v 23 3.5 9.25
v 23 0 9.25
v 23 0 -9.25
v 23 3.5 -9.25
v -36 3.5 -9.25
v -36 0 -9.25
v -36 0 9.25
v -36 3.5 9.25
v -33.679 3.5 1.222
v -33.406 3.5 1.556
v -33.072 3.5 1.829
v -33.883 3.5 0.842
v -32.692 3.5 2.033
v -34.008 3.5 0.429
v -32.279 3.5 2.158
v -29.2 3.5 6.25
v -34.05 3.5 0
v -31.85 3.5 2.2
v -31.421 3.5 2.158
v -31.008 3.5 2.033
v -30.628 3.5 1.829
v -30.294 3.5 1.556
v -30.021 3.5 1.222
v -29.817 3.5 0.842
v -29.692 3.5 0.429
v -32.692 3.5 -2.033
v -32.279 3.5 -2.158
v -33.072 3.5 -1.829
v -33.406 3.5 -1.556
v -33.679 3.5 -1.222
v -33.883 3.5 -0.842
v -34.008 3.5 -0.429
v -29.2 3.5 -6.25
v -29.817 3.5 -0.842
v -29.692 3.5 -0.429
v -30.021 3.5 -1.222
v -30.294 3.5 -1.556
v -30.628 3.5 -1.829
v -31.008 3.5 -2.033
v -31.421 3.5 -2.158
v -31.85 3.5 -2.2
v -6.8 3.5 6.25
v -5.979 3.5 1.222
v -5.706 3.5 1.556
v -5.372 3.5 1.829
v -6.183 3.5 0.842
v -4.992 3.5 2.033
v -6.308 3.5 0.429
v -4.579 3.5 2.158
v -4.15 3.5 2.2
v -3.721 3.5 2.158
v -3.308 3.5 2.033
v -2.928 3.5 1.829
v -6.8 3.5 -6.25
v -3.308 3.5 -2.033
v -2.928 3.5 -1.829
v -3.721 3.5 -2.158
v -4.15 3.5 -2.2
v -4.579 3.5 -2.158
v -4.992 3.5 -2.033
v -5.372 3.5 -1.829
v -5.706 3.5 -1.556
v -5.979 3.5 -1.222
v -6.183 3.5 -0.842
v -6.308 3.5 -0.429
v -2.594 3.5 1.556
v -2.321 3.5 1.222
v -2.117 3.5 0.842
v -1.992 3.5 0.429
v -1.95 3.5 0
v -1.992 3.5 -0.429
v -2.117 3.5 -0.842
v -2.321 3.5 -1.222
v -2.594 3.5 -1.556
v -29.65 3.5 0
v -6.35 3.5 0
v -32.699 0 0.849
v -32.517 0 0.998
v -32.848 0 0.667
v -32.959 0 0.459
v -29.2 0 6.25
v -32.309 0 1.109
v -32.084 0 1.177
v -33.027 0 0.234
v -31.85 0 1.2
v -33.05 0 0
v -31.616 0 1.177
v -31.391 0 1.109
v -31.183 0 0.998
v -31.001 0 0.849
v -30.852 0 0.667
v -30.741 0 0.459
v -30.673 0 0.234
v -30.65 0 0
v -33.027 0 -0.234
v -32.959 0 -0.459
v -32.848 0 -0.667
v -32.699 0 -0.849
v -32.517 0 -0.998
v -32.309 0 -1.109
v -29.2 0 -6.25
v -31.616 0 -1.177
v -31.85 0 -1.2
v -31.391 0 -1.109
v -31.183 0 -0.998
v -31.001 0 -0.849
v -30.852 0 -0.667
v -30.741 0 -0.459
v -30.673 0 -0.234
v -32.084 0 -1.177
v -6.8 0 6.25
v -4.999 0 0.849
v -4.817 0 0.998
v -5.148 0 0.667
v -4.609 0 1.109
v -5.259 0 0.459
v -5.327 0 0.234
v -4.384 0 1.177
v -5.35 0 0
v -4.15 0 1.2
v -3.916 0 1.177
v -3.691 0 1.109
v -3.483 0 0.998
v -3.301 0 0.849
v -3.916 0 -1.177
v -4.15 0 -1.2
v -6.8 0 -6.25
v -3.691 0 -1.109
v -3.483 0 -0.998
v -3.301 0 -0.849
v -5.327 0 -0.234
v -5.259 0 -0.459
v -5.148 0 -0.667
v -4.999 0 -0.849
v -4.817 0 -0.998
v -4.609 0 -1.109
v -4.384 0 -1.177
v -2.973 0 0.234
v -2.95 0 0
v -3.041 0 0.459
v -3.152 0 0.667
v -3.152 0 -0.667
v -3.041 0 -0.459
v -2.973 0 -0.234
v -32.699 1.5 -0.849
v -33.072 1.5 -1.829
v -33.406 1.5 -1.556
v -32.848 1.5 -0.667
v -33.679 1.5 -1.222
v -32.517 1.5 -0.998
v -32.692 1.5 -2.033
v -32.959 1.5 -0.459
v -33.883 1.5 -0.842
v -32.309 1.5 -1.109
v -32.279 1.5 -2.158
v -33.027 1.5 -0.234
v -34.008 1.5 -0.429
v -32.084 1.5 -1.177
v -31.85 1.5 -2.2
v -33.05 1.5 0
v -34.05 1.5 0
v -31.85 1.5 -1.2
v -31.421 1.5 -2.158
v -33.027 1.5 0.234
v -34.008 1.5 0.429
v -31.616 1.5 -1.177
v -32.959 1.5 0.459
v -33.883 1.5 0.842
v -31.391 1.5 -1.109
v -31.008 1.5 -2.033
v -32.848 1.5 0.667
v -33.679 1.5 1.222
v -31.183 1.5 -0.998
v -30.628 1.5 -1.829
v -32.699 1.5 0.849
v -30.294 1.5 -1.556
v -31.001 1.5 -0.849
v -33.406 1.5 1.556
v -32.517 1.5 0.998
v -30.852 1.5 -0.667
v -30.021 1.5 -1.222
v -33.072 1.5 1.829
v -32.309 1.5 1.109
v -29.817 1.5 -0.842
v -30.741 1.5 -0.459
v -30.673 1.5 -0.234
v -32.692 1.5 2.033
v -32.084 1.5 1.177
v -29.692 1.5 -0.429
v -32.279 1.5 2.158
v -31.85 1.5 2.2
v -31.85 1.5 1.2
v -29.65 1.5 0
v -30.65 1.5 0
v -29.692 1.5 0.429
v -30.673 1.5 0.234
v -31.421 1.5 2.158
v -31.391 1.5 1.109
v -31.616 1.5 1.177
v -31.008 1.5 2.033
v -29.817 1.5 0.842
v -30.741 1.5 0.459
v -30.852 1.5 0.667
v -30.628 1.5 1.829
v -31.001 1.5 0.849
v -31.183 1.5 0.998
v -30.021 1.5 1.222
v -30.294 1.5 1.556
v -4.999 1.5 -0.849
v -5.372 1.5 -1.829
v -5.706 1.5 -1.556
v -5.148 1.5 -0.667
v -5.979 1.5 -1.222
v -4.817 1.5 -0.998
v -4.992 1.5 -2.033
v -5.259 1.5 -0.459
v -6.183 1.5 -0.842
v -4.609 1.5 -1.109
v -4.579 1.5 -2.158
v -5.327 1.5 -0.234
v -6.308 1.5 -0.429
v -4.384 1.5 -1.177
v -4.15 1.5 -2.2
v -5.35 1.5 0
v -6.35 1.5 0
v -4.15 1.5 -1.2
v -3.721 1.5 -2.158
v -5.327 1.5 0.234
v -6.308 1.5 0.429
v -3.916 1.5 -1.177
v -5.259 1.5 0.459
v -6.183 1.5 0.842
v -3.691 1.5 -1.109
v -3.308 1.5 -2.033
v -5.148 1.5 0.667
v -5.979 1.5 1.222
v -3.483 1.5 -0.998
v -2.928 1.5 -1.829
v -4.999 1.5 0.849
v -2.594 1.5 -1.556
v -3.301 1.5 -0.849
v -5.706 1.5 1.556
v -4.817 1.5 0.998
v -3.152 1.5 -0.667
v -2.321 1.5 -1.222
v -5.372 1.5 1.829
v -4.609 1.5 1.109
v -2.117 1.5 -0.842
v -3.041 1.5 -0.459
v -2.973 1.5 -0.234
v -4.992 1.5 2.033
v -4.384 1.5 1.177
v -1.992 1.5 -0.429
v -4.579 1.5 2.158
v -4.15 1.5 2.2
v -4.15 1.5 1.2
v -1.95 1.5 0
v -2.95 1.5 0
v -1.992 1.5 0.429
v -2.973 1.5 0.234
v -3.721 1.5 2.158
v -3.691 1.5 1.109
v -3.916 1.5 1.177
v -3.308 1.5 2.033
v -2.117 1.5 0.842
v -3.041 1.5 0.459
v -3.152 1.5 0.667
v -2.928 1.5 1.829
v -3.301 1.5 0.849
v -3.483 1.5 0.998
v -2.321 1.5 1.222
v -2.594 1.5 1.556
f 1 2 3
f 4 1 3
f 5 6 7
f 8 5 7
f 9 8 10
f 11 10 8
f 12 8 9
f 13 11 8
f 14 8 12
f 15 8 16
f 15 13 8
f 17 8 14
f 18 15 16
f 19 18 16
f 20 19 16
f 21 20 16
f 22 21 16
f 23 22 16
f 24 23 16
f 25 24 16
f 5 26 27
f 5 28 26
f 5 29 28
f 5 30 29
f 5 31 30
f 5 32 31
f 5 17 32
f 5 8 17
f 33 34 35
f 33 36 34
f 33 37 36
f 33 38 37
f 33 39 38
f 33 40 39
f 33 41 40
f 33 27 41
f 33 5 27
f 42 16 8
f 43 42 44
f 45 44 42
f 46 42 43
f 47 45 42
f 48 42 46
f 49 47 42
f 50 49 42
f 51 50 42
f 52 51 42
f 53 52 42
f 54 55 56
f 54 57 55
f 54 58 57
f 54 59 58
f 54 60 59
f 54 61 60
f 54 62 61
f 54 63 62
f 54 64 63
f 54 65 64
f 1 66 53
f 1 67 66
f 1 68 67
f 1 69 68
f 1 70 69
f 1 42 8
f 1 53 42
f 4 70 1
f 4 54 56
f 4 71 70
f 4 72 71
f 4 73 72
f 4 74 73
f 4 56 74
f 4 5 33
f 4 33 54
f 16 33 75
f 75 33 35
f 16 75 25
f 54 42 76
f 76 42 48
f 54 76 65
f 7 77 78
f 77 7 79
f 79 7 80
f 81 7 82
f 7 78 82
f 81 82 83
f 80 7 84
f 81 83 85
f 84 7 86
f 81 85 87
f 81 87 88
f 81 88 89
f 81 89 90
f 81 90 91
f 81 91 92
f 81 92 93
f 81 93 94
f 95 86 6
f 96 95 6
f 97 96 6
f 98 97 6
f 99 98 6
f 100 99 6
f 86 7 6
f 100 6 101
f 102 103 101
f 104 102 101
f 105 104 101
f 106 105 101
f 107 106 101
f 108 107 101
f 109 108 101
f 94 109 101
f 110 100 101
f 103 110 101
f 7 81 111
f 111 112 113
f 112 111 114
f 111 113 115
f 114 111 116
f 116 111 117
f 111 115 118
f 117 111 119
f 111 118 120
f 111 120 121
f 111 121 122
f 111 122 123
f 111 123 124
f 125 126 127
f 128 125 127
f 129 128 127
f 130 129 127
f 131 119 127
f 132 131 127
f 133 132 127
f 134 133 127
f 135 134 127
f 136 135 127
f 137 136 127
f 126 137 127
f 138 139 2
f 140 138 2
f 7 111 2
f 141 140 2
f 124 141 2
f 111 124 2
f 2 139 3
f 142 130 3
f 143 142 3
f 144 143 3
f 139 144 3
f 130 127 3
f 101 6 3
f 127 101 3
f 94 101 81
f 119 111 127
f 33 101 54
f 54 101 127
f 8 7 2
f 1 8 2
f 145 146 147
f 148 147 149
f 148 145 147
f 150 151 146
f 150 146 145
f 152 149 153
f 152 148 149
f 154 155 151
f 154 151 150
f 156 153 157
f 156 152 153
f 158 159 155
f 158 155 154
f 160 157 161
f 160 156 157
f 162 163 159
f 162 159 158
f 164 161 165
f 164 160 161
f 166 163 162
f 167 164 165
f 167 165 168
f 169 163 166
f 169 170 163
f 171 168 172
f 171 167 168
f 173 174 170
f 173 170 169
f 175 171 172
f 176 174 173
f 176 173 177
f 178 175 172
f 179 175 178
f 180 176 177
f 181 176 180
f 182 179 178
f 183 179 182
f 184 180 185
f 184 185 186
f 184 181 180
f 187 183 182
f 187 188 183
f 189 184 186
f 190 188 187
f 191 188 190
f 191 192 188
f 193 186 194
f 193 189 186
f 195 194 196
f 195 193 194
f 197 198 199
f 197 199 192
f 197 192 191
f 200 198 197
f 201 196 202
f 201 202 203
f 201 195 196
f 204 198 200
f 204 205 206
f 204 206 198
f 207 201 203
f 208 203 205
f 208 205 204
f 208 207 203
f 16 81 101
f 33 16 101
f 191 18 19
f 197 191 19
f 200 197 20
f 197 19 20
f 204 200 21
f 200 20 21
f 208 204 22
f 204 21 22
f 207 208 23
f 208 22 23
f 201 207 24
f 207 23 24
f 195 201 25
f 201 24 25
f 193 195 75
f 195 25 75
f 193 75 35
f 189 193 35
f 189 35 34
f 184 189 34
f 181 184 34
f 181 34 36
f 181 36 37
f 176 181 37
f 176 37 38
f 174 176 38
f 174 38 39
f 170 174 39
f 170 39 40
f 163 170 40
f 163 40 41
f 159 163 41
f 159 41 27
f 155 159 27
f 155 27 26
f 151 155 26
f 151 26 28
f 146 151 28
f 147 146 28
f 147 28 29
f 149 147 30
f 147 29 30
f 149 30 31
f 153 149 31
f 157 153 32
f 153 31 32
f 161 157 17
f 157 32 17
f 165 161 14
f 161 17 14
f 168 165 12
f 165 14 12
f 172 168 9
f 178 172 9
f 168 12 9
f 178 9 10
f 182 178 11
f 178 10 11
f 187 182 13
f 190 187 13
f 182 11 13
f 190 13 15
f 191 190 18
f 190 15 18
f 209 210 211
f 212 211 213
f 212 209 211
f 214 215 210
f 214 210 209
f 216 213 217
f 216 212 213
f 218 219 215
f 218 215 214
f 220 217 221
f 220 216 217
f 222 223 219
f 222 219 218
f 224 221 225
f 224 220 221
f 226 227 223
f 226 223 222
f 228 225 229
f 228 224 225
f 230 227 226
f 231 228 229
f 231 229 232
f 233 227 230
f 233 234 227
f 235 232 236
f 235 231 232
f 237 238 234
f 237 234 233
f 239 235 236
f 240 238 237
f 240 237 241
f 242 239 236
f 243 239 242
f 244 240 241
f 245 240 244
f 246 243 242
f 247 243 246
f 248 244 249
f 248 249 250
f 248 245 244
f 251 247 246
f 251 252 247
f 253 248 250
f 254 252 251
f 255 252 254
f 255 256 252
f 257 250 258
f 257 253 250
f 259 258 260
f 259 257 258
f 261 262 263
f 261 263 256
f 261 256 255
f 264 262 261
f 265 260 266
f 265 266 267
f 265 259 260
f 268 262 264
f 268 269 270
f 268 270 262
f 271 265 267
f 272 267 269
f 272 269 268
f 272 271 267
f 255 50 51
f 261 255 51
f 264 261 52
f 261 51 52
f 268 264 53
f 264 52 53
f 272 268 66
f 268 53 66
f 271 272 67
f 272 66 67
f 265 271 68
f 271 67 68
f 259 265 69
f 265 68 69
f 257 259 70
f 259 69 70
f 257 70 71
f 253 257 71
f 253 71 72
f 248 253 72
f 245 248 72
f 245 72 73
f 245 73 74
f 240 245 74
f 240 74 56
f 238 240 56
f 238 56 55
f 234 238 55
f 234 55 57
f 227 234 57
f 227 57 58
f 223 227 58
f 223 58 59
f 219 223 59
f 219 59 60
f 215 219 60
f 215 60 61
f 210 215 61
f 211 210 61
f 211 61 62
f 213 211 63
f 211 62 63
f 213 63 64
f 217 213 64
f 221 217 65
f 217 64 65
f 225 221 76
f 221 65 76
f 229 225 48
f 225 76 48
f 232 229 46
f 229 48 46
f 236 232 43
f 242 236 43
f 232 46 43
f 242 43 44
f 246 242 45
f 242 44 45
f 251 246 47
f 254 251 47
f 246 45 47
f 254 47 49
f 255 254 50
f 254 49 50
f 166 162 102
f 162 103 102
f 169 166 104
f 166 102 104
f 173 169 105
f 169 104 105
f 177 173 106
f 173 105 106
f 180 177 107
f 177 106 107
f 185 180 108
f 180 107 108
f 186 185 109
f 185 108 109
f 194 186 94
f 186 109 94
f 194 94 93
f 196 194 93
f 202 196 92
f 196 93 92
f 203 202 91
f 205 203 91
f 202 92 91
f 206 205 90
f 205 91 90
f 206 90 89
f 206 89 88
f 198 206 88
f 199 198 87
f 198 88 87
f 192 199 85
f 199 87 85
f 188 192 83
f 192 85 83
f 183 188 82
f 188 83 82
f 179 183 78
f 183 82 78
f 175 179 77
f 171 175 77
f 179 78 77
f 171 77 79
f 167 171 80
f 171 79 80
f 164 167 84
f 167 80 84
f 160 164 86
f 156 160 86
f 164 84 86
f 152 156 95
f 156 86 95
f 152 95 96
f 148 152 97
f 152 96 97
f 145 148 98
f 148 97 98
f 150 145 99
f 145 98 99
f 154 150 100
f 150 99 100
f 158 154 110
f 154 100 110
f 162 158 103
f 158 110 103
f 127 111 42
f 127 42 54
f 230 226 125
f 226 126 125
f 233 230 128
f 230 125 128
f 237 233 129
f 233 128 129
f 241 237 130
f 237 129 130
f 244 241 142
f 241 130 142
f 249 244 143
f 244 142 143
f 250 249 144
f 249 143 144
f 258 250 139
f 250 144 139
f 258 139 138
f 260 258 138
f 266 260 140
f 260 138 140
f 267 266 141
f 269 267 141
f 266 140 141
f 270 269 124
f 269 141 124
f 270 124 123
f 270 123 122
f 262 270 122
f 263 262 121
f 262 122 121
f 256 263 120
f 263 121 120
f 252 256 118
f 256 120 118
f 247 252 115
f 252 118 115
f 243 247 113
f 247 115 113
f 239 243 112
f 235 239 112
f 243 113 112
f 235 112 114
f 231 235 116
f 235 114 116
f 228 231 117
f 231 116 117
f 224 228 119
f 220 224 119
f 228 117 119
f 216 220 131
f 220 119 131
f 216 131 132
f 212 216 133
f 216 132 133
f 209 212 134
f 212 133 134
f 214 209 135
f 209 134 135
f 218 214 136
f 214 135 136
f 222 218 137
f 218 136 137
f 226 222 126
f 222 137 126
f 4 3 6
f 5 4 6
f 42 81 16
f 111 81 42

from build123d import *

# Parameters (mm, degrees)
SKETCH_1_W                   = 22.4
SKETCH_1_H                   = 12.5
EXTRUDE_1_DEPTH              = 3.5
HOLE_WIZARD_M2_2_D           = 2.4
HOLE_WIZARD_M2_2_CBORE_D     = 4.4
HOLE_WIZARD_M2_2_CBORE_DEPTH = 2


with BuildPart() as part:
    # 草图1 → 凸台-拉伸1 (new body)
    with BuildSketch(Plane(origin=(0, 0, 0), x_dir=(1, 0, 0), z_dir=(0, 1, 0))):
        Polygon((-36, -9.25), (0, -9.25), (23, -9.25), (23, 9.25), (0, 9.25), (-36, 9.25), align=None)
        with Locations((-18, 0)):
            Rectangle(SKETCH_1_W, SKETCH_1_H, mode=Mode.SUBTRACT)
    extrude(amount=EXTRUDE_1_DEPTH)

    # M2 凹头盖螺钉的柱形沉头孔2 (through all)
    with Locations(Plane(origin=(-31.85, 3.5, 0), x_dir=(0, 0, 1), z_dir=(0, 1, 0))):
        with Locations((0, 0), (0, 27.7)):
            CounterBoreHole(HOLE_WIZARD_M2_2_D / 2, HOLE_WIZARD_M2_2_CBORE_D / 2, HOLE_WIZARD_M2_2_CBORE_DEPTH)


solid = part.part
